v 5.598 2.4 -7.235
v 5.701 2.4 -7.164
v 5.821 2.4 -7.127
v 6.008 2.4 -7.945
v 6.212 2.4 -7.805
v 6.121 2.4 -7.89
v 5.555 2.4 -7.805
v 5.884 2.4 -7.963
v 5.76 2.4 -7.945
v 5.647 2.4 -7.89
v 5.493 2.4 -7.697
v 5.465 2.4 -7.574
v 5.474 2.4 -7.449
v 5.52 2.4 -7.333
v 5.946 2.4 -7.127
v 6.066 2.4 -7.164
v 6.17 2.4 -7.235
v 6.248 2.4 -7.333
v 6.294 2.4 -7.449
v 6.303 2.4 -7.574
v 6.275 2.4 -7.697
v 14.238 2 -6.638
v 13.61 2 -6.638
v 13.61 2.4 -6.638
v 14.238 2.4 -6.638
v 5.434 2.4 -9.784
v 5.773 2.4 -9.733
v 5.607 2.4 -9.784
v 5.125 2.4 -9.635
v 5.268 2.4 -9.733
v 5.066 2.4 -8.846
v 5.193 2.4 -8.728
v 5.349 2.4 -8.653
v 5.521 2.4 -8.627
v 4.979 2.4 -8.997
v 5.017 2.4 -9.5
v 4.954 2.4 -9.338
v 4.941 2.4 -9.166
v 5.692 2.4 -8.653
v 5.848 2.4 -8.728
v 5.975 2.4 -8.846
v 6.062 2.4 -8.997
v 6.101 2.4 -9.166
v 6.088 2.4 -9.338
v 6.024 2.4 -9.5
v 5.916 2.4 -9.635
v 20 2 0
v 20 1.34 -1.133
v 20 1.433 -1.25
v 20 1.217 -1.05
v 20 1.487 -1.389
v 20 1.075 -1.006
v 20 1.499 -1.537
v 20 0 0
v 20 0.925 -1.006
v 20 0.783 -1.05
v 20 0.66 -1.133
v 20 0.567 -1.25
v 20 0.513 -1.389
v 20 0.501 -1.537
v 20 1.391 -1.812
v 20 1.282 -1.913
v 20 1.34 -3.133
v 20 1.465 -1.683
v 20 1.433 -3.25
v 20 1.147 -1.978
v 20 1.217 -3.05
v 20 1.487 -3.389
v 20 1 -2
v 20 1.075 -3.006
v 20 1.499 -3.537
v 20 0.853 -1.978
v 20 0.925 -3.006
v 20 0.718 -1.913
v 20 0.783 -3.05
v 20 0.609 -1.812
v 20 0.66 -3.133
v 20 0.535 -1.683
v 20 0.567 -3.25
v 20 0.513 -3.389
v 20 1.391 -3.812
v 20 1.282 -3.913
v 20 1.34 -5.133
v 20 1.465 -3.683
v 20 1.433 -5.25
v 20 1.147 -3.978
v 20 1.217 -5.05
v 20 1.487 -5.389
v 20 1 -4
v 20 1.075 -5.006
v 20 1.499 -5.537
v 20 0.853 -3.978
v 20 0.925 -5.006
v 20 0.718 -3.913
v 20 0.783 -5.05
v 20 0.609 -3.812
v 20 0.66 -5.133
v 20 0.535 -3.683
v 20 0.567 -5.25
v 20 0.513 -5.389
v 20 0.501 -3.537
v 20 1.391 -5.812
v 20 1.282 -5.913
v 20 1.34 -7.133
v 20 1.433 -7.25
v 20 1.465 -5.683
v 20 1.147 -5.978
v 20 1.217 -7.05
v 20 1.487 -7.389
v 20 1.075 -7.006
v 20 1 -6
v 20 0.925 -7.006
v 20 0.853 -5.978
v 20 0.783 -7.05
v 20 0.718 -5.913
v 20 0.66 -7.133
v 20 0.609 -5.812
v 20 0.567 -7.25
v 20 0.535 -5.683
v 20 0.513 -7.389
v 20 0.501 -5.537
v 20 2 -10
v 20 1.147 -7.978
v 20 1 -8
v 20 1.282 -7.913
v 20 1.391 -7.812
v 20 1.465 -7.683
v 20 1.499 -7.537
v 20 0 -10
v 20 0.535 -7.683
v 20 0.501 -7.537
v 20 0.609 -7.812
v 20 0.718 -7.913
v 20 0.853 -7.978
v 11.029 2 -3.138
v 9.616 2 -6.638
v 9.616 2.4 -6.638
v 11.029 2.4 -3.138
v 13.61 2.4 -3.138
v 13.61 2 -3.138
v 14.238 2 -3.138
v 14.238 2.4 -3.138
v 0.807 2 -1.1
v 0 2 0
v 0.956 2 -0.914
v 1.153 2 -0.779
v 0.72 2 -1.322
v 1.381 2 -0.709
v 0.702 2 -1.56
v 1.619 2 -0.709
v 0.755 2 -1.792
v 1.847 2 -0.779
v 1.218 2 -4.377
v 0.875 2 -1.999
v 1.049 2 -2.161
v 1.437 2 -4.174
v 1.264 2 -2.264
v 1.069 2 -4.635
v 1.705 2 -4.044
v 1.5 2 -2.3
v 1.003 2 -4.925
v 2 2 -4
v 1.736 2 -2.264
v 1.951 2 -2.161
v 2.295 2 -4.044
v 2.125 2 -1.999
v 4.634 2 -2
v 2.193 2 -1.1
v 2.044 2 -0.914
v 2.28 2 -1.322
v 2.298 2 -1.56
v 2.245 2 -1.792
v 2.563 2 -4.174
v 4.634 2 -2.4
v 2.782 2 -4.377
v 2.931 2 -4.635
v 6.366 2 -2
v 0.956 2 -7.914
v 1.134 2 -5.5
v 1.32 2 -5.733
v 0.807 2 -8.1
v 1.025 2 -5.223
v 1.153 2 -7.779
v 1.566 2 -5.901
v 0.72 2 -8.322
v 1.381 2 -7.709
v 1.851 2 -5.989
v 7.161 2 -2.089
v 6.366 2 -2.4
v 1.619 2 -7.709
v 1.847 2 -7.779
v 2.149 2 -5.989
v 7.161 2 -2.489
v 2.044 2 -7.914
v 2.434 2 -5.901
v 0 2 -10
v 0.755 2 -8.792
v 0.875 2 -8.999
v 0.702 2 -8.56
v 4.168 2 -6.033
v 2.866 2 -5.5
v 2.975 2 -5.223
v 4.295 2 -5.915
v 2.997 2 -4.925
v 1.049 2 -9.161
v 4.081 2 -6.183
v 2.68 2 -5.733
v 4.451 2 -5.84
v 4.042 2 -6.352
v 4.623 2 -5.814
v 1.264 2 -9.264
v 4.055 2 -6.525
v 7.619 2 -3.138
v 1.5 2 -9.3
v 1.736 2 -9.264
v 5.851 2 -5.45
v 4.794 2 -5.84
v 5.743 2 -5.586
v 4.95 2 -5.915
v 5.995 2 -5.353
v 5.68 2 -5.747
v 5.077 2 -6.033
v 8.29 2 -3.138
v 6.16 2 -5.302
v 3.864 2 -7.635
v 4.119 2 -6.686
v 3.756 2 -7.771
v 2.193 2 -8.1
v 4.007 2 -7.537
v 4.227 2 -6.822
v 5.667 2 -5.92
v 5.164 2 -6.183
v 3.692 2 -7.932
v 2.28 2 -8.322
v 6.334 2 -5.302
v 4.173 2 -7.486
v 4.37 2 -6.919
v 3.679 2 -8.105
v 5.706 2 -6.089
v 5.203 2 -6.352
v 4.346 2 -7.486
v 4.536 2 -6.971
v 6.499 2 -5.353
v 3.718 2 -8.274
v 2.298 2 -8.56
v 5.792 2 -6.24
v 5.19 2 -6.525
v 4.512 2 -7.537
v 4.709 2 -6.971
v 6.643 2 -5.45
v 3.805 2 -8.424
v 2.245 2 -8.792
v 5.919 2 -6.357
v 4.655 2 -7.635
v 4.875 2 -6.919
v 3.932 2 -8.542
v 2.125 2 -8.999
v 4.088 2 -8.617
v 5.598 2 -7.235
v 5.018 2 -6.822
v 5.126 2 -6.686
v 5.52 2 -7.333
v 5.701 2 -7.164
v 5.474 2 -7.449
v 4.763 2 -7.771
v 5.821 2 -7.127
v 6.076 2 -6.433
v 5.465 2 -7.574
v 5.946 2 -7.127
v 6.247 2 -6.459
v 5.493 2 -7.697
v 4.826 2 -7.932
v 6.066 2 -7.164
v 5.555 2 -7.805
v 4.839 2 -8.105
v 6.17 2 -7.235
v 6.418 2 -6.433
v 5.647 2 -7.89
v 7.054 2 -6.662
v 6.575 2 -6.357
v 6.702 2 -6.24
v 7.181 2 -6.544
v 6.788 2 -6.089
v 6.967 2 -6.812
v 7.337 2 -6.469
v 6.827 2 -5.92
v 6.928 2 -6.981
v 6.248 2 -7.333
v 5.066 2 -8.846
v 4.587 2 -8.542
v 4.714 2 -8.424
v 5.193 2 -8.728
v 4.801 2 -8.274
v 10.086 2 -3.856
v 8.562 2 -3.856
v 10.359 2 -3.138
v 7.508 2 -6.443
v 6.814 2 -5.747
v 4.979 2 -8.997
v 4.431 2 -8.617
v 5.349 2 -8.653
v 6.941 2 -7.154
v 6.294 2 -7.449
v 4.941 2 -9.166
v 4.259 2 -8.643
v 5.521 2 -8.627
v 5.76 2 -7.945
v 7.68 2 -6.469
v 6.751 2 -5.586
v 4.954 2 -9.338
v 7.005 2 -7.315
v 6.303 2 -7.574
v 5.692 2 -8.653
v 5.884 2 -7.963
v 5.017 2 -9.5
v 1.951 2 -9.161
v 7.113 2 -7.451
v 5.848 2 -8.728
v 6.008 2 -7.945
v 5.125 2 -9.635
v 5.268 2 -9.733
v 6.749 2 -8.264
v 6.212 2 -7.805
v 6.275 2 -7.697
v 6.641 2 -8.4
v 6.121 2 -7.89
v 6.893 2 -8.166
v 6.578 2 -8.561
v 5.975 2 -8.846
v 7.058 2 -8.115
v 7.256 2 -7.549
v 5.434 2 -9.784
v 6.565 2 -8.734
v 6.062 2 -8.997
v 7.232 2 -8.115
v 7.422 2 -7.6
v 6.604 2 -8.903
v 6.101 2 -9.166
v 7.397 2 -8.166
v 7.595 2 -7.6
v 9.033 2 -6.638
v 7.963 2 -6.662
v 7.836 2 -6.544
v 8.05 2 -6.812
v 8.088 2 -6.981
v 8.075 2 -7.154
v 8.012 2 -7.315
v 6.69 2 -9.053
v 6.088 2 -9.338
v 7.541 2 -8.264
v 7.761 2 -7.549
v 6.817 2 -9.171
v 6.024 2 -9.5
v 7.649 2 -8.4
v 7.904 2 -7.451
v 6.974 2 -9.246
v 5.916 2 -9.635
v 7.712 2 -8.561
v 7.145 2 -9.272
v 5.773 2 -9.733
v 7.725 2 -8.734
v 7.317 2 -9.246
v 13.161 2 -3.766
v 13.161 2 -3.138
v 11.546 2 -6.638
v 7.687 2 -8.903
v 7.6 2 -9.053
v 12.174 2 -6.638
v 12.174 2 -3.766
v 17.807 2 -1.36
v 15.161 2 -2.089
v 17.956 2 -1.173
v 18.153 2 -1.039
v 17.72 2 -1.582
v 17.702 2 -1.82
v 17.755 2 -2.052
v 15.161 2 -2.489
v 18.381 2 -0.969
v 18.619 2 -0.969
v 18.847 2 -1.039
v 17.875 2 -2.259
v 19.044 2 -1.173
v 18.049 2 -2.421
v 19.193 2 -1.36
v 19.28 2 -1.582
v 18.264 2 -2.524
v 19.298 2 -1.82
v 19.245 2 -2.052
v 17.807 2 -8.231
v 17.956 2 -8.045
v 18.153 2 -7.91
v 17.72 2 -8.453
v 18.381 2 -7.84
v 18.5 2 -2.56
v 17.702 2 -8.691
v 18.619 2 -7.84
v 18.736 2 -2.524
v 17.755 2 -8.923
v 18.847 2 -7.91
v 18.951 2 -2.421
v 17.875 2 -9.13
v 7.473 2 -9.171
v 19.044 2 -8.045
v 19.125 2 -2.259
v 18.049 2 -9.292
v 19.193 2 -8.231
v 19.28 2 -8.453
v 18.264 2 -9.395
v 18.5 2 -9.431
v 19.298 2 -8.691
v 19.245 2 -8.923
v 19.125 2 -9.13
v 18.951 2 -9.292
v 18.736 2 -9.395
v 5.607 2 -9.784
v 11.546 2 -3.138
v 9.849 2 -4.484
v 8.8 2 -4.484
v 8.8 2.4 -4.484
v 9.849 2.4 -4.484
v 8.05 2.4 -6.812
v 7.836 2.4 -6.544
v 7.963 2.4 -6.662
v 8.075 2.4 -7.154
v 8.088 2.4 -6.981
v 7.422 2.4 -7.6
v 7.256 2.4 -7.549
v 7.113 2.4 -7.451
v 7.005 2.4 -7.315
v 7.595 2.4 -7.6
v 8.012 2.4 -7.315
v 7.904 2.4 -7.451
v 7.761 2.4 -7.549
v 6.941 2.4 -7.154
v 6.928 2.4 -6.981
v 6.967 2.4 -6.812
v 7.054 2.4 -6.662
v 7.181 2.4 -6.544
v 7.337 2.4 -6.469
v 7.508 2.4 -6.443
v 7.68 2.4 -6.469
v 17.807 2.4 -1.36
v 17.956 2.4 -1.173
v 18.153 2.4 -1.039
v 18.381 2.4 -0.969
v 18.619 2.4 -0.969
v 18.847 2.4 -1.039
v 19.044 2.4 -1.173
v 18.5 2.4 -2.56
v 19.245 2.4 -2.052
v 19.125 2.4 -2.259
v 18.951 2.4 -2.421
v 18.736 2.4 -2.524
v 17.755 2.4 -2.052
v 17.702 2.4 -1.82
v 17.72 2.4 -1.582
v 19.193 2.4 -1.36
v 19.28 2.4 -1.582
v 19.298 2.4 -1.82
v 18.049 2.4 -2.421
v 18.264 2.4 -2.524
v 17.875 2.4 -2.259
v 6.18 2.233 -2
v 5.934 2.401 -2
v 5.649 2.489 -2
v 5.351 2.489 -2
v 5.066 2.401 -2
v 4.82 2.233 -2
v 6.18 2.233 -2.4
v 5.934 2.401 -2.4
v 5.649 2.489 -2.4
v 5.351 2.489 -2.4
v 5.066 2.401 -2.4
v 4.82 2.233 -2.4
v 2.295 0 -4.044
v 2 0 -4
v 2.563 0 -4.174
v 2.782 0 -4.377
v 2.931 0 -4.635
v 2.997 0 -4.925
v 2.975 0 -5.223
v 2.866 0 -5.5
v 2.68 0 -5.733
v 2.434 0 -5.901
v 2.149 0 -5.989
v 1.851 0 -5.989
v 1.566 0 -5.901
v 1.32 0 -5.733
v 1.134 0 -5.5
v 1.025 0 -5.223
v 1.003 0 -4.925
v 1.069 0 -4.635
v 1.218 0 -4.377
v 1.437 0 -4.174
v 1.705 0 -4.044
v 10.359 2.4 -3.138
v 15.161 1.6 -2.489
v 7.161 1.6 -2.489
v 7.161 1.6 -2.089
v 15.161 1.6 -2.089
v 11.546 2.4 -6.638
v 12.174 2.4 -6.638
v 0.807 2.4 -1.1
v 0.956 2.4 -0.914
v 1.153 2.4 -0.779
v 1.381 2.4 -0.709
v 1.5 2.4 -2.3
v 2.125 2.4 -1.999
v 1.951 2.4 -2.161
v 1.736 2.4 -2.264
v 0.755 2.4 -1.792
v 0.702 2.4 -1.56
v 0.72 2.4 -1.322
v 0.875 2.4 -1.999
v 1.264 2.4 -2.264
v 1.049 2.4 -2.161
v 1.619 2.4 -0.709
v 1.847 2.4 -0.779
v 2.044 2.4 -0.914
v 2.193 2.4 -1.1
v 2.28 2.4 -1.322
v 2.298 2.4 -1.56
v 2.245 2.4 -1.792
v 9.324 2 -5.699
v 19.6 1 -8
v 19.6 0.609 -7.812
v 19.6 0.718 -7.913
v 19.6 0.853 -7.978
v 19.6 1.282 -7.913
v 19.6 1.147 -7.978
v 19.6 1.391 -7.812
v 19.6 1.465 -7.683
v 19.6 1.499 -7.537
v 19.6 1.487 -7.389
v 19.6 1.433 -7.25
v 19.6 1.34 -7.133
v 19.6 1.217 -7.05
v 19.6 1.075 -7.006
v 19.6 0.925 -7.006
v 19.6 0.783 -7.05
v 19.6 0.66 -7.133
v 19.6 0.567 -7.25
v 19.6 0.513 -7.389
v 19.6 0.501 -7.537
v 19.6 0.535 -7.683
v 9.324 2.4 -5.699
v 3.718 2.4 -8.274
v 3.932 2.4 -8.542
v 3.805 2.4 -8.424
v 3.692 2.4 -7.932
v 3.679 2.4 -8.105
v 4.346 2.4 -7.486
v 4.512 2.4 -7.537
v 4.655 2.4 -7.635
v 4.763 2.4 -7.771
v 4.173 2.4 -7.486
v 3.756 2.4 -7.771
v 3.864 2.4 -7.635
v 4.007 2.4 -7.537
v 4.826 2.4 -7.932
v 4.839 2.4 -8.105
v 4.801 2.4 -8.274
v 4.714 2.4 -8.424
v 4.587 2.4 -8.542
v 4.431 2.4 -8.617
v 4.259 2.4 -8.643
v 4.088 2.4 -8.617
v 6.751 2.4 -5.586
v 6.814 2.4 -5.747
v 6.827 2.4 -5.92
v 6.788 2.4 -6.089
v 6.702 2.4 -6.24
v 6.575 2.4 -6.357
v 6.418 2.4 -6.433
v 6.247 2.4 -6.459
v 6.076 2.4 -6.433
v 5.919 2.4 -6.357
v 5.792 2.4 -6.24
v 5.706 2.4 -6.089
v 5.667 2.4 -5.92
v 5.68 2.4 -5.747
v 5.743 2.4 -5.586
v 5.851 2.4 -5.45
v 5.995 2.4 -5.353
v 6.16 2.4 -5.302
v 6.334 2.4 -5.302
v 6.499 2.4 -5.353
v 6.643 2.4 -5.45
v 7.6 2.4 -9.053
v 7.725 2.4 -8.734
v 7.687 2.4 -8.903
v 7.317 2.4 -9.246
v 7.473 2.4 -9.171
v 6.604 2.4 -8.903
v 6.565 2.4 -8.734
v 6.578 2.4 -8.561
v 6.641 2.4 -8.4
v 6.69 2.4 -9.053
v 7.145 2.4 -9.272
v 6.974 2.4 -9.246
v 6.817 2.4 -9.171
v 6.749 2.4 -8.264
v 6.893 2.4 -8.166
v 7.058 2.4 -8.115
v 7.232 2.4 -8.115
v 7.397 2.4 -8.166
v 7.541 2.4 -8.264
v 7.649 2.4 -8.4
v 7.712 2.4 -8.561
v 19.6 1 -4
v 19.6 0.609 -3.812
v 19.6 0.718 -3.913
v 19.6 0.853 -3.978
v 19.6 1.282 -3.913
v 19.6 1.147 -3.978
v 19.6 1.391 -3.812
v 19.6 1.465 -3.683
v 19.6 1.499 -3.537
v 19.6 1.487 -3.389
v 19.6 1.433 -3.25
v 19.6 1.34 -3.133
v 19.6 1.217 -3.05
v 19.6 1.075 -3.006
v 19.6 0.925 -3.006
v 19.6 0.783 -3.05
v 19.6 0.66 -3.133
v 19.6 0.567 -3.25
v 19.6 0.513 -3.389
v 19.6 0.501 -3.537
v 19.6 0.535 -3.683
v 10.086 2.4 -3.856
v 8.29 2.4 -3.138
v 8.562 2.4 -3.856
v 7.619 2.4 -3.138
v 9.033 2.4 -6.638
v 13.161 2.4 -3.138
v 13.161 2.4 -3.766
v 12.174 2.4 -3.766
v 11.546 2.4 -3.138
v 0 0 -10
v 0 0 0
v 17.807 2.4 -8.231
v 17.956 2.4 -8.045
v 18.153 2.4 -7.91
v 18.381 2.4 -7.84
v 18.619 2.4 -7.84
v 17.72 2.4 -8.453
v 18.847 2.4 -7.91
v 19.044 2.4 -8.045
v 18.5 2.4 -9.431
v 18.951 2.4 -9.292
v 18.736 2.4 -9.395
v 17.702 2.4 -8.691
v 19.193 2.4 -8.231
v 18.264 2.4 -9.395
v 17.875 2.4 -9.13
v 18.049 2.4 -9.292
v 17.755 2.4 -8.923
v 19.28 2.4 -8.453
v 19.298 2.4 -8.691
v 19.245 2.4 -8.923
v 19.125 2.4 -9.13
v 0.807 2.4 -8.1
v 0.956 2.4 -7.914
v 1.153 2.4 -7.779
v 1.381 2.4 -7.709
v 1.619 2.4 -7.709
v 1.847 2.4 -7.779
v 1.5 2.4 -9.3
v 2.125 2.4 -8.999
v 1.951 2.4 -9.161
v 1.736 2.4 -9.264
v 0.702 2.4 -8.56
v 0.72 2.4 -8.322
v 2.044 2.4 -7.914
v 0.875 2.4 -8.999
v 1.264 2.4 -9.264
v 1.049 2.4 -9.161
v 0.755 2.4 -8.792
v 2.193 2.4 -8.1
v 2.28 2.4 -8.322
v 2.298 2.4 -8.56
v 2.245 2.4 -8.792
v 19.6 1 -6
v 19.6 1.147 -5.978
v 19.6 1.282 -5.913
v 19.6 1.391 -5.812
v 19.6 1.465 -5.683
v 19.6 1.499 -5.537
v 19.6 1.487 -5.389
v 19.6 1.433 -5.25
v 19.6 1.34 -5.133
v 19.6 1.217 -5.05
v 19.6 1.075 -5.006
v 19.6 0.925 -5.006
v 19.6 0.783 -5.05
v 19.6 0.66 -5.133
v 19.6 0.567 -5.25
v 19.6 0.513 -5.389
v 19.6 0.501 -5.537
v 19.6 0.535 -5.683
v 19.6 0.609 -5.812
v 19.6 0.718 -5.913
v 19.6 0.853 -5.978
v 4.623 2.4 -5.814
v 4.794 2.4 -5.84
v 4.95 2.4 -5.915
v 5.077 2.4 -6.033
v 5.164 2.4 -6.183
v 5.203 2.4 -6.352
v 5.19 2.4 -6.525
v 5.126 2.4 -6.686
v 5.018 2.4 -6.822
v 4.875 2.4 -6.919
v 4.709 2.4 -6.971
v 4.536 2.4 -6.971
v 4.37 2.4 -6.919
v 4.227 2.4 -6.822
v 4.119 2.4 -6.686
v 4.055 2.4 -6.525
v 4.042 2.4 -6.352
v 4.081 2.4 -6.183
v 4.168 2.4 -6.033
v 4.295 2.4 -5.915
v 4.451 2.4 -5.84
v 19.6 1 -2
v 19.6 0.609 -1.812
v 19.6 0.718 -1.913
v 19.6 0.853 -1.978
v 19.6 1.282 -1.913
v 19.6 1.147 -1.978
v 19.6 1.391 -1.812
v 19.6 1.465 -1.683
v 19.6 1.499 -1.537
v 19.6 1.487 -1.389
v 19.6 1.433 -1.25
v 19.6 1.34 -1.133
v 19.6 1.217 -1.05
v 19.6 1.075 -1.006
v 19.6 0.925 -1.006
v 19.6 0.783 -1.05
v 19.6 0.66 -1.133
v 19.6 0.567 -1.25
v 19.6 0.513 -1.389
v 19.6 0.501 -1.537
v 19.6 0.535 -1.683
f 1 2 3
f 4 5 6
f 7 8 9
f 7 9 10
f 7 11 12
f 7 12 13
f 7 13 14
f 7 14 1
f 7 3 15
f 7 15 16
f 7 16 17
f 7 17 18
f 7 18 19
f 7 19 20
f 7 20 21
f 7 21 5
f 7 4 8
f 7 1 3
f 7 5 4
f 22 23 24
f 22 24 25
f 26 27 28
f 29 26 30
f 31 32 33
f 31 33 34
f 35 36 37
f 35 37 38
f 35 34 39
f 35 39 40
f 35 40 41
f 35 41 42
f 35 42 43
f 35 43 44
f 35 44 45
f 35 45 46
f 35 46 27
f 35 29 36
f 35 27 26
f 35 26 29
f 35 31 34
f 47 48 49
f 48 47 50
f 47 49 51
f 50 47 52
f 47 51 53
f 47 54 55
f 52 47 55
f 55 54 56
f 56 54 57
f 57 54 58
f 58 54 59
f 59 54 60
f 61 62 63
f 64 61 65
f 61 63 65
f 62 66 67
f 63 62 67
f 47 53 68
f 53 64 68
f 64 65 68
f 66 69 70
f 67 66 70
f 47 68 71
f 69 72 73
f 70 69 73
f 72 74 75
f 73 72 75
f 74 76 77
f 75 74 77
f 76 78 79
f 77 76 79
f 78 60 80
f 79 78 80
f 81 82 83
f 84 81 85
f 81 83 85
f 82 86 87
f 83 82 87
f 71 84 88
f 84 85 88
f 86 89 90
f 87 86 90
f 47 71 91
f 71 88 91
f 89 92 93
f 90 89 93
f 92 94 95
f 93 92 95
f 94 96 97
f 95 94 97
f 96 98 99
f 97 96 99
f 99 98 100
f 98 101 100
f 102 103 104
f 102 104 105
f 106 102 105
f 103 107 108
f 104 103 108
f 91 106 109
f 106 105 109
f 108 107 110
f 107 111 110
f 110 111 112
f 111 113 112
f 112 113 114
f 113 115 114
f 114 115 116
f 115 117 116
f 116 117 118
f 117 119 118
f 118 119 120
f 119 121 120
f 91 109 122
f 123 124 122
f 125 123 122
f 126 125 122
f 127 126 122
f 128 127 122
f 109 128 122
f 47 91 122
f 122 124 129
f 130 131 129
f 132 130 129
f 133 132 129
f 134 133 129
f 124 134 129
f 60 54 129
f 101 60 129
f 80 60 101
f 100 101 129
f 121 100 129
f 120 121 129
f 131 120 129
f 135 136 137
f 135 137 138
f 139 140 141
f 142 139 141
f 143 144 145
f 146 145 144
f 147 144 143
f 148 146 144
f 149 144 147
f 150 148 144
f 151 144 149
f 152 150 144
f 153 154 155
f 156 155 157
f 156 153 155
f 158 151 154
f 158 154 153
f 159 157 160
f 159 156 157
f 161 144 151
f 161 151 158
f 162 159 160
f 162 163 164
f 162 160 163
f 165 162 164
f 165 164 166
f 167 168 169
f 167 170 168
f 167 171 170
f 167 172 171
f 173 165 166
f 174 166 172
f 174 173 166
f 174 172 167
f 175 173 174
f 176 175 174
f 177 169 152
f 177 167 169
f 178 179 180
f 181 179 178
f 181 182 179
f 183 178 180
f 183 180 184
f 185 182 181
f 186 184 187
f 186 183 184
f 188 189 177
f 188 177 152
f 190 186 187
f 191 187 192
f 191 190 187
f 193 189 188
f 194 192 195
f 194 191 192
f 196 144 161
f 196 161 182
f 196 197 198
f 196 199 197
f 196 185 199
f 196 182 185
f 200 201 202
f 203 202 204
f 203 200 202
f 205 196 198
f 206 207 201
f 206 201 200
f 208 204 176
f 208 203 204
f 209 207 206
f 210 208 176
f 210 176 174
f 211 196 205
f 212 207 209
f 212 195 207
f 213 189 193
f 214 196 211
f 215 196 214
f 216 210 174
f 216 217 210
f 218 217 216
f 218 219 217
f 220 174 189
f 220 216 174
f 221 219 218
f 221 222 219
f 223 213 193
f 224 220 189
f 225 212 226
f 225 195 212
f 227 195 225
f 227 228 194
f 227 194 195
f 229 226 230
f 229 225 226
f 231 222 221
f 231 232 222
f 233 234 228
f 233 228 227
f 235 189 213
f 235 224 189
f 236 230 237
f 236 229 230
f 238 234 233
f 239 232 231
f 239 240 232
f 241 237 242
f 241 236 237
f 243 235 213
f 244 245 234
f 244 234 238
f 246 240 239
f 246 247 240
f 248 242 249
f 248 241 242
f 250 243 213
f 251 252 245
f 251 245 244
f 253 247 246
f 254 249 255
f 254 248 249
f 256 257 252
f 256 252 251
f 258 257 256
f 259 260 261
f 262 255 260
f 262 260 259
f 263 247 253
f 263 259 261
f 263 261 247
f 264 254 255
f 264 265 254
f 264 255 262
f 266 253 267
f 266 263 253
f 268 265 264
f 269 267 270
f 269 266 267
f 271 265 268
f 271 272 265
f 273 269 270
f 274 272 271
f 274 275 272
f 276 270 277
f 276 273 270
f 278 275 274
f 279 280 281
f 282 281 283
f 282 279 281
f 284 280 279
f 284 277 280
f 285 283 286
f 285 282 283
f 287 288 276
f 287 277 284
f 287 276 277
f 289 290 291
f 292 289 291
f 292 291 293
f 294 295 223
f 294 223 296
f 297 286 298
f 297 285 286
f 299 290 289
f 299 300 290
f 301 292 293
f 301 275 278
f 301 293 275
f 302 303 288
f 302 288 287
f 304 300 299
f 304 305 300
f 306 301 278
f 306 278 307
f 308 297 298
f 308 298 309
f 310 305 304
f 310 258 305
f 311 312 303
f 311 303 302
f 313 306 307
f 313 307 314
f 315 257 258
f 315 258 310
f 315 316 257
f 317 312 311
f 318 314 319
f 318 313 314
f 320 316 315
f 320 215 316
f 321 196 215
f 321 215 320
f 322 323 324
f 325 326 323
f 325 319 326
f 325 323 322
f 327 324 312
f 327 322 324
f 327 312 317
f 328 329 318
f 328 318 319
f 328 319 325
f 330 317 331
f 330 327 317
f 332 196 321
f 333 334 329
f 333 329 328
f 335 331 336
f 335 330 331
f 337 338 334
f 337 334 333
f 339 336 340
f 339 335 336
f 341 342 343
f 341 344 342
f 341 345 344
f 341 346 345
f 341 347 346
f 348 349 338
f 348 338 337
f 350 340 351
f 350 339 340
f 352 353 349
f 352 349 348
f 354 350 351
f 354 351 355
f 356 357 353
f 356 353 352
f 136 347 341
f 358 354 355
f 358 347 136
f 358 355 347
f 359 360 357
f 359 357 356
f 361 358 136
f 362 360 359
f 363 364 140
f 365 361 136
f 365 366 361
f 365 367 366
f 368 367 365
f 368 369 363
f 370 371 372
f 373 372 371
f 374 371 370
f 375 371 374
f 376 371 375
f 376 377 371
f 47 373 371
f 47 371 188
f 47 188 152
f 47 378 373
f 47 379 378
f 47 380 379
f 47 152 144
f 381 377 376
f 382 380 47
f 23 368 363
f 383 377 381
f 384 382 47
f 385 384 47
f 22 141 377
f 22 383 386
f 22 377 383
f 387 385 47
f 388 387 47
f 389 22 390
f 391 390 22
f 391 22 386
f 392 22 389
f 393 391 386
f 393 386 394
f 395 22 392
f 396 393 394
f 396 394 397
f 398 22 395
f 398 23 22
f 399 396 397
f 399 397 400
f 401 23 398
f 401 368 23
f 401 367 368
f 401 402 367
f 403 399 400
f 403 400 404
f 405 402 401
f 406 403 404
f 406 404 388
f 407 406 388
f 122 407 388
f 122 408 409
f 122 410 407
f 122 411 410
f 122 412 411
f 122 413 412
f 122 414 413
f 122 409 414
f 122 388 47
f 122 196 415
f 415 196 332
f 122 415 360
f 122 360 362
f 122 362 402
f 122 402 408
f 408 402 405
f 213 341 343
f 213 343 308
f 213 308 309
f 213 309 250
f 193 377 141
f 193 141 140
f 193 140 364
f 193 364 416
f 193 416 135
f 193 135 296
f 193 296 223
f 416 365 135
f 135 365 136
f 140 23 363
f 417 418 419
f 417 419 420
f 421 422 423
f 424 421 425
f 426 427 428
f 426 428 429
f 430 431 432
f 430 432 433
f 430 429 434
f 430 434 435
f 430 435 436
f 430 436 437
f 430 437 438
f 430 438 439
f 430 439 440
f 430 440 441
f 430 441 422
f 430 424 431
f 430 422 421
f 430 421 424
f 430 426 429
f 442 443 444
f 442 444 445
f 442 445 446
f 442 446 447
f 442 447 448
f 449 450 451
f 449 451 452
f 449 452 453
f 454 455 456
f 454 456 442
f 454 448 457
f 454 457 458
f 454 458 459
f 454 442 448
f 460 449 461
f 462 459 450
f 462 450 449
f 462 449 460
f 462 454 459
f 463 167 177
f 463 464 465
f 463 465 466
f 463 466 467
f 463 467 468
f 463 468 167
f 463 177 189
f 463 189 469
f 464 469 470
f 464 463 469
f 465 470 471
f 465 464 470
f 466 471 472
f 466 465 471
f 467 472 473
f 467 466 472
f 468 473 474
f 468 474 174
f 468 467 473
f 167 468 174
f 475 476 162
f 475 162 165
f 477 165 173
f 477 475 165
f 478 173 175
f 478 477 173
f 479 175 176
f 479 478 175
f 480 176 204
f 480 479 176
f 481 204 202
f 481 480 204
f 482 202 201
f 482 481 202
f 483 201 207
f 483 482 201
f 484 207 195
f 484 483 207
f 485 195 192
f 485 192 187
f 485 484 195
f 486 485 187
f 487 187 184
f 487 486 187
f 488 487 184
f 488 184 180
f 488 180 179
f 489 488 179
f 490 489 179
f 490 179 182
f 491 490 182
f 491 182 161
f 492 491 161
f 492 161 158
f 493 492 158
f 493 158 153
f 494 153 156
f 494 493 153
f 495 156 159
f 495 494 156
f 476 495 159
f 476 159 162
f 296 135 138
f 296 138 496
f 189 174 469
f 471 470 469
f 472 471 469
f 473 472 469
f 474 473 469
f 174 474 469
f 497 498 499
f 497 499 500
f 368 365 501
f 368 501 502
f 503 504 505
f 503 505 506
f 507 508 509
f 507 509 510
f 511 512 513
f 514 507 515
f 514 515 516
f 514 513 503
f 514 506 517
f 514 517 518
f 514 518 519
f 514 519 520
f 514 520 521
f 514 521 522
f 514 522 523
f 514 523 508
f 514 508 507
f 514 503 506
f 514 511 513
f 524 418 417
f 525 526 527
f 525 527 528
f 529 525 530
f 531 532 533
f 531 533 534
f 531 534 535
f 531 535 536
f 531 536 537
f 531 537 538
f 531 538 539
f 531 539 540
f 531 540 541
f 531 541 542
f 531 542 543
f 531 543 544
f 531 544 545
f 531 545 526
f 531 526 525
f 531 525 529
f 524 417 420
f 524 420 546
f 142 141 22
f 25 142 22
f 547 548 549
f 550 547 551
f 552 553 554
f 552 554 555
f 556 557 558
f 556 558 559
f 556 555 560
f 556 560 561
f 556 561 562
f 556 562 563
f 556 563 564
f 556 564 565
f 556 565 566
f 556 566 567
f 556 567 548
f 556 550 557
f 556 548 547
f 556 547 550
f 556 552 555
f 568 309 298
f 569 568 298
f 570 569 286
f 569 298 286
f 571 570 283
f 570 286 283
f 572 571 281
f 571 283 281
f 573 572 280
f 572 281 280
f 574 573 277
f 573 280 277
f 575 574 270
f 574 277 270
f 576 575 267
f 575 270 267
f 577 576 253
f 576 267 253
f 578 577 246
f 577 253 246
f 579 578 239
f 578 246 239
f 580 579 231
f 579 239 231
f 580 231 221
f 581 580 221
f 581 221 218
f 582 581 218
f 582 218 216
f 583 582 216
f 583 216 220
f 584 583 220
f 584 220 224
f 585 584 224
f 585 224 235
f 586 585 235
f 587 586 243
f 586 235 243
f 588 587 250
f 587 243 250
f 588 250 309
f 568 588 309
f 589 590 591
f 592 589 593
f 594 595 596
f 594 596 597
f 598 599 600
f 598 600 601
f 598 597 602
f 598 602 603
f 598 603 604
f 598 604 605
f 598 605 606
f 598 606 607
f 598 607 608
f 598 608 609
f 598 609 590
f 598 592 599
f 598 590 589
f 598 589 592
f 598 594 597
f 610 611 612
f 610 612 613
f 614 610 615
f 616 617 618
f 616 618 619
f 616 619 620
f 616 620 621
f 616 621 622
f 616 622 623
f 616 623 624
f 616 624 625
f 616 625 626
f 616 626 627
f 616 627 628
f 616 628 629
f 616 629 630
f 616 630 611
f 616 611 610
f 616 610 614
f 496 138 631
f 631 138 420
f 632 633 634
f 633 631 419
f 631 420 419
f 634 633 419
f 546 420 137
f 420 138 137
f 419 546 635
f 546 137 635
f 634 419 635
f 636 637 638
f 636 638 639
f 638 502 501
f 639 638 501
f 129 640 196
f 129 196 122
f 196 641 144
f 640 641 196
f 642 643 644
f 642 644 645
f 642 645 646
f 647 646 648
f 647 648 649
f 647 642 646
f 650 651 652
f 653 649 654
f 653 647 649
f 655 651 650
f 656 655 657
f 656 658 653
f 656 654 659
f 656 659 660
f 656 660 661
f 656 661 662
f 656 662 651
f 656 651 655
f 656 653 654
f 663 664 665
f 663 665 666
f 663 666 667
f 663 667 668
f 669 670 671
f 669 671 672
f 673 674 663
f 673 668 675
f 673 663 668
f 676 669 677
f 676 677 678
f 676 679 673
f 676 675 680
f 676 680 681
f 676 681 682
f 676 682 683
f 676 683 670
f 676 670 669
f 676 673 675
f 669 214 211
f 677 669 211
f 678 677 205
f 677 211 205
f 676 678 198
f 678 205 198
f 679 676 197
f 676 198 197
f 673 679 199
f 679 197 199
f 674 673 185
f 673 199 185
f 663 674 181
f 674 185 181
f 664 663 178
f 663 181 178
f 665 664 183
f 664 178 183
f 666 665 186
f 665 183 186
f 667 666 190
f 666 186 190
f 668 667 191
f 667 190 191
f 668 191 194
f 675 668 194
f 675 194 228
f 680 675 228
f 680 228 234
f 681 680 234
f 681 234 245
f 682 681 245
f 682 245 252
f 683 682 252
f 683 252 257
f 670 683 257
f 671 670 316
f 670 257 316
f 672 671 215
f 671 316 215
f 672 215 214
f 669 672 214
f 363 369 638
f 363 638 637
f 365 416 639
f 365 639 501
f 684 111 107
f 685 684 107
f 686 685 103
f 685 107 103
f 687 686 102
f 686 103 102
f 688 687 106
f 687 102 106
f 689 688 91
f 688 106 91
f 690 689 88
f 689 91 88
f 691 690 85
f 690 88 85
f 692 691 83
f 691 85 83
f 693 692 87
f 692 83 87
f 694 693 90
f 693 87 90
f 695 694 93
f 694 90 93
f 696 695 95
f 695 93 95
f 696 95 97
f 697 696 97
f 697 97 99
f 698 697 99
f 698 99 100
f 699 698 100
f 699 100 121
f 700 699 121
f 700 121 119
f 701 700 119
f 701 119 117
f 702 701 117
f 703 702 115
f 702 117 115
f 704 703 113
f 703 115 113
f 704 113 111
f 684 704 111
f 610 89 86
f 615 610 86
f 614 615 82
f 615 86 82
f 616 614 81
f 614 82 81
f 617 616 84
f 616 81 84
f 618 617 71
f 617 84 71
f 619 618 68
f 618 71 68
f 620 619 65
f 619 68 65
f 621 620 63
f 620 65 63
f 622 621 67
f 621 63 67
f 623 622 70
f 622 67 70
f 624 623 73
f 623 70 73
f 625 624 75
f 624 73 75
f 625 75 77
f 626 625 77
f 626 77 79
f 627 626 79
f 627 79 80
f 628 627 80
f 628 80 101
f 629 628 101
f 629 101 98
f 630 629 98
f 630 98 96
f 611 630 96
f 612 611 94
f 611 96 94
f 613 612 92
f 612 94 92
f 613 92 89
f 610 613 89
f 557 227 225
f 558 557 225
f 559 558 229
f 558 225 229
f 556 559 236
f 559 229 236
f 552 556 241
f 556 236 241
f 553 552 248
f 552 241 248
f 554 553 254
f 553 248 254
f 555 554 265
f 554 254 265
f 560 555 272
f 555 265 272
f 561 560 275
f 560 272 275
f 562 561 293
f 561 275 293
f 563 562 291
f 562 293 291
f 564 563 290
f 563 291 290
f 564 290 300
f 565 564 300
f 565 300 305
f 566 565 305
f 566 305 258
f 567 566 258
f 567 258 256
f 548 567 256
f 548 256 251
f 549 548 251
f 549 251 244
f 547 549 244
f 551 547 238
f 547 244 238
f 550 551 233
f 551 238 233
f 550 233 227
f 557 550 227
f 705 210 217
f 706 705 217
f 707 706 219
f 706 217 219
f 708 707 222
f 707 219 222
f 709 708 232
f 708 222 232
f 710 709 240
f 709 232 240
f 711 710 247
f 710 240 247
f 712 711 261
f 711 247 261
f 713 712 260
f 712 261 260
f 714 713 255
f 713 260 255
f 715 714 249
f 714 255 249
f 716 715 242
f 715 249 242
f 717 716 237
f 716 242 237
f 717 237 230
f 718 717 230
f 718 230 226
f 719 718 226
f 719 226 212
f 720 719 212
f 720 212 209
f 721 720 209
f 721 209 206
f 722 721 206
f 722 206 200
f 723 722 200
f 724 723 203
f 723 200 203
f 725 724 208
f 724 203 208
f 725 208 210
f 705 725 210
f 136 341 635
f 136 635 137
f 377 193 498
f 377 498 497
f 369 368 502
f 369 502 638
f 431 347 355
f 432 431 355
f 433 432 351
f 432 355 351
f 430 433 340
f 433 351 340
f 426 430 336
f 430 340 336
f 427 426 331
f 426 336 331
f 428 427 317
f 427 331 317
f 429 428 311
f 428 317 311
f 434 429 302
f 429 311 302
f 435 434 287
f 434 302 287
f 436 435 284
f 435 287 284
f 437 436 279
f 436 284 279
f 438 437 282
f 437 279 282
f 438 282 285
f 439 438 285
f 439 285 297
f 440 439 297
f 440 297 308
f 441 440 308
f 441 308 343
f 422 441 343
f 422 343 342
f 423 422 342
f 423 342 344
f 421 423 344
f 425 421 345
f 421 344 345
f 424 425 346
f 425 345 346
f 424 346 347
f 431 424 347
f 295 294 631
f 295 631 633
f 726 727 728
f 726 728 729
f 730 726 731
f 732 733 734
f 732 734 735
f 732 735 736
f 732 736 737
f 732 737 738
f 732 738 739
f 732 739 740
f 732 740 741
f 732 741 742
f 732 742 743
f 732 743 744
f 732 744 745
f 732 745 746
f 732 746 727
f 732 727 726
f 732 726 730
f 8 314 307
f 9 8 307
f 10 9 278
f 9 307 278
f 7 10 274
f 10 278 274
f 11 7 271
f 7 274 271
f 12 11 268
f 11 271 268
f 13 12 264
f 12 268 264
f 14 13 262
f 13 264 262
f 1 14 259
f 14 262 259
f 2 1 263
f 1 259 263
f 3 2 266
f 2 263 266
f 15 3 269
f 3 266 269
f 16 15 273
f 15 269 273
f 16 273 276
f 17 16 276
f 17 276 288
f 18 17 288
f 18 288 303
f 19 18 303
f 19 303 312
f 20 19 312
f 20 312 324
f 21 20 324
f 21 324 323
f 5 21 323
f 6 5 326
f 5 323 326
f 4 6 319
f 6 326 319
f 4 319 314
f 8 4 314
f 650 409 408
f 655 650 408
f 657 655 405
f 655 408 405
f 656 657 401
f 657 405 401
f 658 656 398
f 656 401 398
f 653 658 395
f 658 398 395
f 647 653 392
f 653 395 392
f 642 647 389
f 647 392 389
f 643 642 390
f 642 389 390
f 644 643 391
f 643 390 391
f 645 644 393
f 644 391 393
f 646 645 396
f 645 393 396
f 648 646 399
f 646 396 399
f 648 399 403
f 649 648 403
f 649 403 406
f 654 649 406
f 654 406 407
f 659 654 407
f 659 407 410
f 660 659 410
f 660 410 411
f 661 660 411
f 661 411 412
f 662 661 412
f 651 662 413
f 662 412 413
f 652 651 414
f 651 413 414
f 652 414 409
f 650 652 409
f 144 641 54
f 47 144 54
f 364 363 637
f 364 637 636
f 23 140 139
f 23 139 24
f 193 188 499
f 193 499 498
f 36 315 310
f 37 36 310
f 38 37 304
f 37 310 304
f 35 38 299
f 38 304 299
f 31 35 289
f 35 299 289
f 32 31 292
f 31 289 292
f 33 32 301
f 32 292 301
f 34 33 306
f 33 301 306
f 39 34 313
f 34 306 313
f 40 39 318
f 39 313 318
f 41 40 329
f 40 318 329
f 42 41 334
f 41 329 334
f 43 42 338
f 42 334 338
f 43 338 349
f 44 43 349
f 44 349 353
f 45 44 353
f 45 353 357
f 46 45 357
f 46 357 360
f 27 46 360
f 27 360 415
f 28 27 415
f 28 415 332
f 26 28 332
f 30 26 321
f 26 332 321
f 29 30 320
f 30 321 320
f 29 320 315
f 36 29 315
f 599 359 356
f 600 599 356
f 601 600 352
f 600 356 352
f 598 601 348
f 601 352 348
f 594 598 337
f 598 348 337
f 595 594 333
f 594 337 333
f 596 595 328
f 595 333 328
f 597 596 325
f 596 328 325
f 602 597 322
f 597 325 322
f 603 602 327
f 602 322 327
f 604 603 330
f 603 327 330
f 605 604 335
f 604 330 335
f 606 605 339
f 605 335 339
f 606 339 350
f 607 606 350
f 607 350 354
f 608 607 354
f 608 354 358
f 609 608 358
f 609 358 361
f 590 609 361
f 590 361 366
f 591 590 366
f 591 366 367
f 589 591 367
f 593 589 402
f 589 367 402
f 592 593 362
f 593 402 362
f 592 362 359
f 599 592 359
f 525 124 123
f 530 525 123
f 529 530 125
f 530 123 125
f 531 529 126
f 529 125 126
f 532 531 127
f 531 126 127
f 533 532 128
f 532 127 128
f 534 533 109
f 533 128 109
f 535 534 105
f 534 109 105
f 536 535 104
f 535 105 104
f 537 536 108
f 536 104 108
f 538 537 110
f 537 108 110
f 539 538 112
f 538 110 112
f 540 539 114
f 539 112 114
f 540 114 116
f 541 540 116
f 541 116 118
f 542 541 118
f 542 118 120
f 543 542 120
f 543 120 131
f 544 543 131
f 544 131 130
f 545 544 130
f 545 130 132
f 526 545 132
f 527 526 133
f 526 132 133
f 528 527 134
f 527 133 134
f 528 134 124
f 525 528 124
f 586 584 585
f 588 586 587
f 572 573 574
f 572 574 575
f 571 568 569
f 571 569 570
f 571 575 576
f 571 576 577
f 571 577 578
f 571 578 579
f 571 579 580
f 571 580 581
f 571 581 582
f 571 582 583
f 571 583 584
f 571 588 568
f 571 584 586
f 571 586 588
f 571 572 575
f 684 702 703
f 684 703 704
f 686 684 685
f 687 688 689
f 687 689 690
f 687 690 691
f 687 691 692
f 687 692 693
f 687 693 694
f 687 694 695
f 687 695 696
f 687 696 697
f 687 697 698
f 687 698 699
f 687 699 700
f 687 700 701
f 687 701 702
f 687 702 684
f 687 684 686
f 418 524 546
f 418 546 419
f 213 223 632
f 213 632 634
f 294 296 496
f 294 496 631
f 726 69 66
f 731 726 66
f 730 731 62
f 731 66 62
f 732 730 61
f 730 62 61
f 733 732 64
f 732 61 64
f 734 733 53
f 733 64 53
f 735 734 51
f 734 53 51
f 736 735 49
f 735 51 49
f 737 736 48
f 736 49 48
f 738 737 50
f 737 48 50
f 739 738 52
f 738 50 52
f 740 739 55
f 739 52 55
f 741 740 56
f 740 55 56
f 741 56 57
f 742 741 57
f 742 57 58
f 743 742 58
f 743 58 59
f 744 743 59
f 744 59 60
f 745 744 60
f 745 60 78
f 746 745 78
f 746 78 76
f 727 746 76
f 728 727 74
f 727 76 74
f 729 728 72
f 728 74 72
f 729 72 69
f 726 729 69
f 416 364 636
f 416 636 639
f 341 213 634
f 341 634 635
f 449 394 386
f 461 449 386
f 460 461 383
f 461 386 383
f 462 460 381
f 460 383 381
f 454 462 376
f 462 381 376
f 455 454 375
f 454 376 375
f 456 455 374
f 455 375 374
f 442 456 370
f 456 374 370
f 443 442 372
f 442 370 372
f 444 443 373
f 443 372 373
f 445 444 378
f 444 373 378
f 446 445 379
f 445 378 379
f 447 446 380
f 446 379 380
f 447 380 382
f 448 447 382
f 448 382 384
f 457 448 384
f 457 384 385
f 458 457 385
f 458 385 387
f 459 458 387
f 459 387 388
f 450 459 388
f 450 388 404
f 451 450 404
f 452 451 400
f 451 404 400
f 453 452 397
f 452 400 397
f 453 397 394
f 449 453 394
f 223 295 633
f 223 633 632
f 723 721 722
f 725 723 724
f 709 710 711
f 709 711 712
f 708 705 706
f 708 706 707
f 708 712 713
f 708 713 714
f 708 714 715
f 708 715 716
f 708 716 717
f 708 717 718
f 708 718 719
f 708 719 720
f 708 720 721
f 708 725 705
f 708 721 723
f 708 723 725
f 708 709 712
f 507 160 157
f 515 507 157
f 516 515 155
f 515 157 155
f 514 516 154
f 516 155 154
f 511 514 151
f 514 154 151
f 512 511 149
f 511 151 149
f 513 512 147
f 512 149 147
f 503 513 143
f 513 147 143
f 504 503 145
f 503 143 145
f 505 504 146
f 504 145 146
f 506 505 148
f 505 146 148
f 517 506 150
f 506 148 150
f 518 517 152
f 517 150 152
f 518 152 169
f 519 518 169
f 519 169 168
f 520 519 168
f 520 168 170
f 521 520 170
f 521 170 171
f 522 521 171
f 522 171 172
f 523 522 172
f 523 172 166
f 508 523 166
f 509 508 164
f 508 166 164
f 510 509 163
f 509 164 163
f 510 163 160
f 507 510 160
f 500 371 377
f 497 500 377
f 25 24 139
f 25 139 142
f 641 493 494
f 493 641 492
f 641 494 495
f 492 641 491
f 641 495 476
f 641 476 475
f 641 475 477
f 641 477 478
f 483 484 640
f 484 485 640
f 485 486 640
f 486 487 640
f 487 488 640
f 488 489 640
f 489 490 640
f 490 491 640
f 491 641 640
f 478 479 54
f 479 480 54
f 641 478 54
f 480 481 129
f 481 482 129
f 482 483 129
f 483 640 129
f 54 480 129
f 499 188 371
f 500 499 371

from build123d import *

# Parameters (mm, degrees)
SKETCH1_W           = 20
SKETCH1_H           = 10
SKETCH1_R           = 1
BOSS_EXTRUDE1_DEPTH = 2
SKETCH2_W           = 0.628205128
SKETCH2_H           = 3.5
BOSS_EXTRUDE2_DEPTH = 0.4
SKETCH4_W           = 8
SKETCH4_H           = 0.4
CUT_EXTRUDE4_DEPTH  = 0.4
SKETCH5_R           = 0.8
BOSS_EXTRUDE3_DEPTH = 0.4
SKETCH7_R           = 0.581669736
BOSS_EXTRUDE4_DEPTH = 0.4
SKETCH6_R           = 0.420338274
BOSS_EXTRUDE5_DEPTH = 0.4
CIRPATTERN1_COUNT   = 6
SKETCH8_R           = 0.5
CUT_EXTRUDE6_DEPTH  = 0.4
LPATTERN1_COUNT     = 4
LPATTERN1_PITCH     = 2
BOSS_EXTRUDE6_START = -2
SKETCH10_R          = 1
BOSS_EXTRUDE6_DEPTH = 0.4


with BuildPart() as part:
    # Sketch1 → Boss-Extrude1 (new body)
    with BuildSketch(Plane(origin=(0, 0, 0), x_dir=(1, 0, 0), z_dir=(0, 1, 0))):
        with Locations((10, 5)):
            Rectangle(SKETCH1_W, SKETCH1_H)
        with Locations(Location((2, 5, 0), (0, 0, 270))):
            Circle(SKETCH1_R, mode=Mode.SUBTRACT)
    extrude(amount=BOSS_EXTRUDE1_DEPTH)

    # Sketch2 → Boss-Extrude2 (add)
    # profile 1 of 3: a face of its own
    with BuildSketch(Plane(origin=(0, 2, 0), x_dir=(1, 0, 0), z_dir=(0, 1, 0))):
        Polygon((9.033403528, 6.638234894), (9.616035739, 6.638234894), (11.029497278, 3.138234894), (10.35852372, 3.138234894), (10.086488463, 3.856183612), (8.56154856, 3.856183612), (8.289513303, 3.138234894), (7.619240867, 3.138234894), align=None)
        Polygon((9.324369072, 5.69943281), (8.79992997, 4.48438874), (9.848808175, 4.48438874), align=None, mode=Mode.SUBTRACT)
    # profile 2 of 3: a face of its own
    with BuildSketch(Plane(origin=(0, 2, 0), x_dir=(1, 0, 0), z_dir=(0, 1, 0))):
        Polygon((11.545522919, 6.638234894), (12.173728047, 6.638234894), (12.173728047, 3.766440022), (13.160907534, 3.766440022), (13.160907534, 3.138234894), (11.545522919, 3.138234894), align=None)
    # profile 3 of 3: a face of its own
    with BuildSketch(Plane(origin=(0, 2, 0), x_dir=(1, 0, 0), z_dir=(0, 1, 0))):
        with Locations((13.923728047, 4.888234894)):
            Rectangle(SKETCH2_W, SKETCH2_H)
    extrude(amount=BOSS_EXTRUDE2_DEPTH)

    # Sketch4 → Cut-Extrude4 (cut)
    with BuildSketch(Plane(origin=(0, 2, 0), x_dir=(1, 0, 0), z_dir=(0, 1, 0))):
        with Locations((11.161065363, 2.289063397)):
            Rectangle(SKETCH4_W, SKETCH4_H)
    extrude(amount=-CUT_EXTRUDE4_DEPTH, mode=Mode.SUBTRACT)

    # Sketch5 → Boss-Extrude3 (add)
    with BuildSketch(Plane(origin=(0, 2, 0), x_dir=(1, 0, 0), z_dir=(0, 1, 0))):
        with Locations(Location((1.5, 8.5, 0), (0, 0, 90))):
            Circle(SKETCH5_R)
        with Locations(Location((18.5, 8.630956257, 0), (0, 0, 90))):
            Circle(SKETCH5_R)
        with Locations(Location((18.5, 1.759911555, 0), (0, 0, 90))):
            Circle(SKETCH5_R)
        with Locations(Location((1.5, 1.5, 0), (0, 0, 90))):
            Circle(SKETCH5_R)
    extrude(amount=BOSS_EXTRUDE3_DEPTH)

    # Sketch7 → Boss-Extrude4 (add)
    with BuildSketch(Plane(origin=(0, 2, 0), x_dir=(1, 0, 0), z_dir=(0, 1, 0))):
        with Locations(Location((7.145081421, 8.690538135, 0), (0, 0, 90))):
            Circle(SKETCH7_R)
    boss_extrude4 = extrude(amount=BOSS_EXTRUDE4_DEPTH)

    # Sketch6 → Boss-Extrude5 (add)
    with BuildSketch(Plane(origin=(0, 2, 0), x_dir=(1, 0, 0), z_dir=(0, 1, 0))):
        with Locations(Location((5.883797923, 7.542946747, 0), (0, 0, 90))):
            Circle(SKETCH6_R)
    extrude(amount=BOSS_EXTRUDE5_DEPTH)

    # CirPattern1: Boss-Extrude4 ×6 about axis
    cirpattern1_axis = Axis((5.883797923, 0, -7.542946747), (0, 1, 0))
    for i in range(1, CIRPATTERN1_COUNT):
        add(boss_extrude4.rotate(cirpattern1_axis, i * 360 / CIRPATTERN1_COUNT))

    # Sketch8 → Cut-Extrude6 (cut)
    with BuildSketch(Plane(origin=(20, 0, 0), x_dir=(0, 0, -1), z_dir=(1, 0, 0))):
        with Locations((1.5, 1)):
            Circle(SKETCH8_R)
    cut_extrude6 = extrude(amount=-CUT_EXTRUDE6_DEPTH, mode=Mode.SUBTRACT)

    # LPattern1: Cut-Extrude6 ×4
    with Locations(*[(0, 0, -i * LPATTERN1_PITCH) for i in range(1, LPATTERN1_COUNT)]):
        add(cut_extrude6, mode=Mode.SUBTRACT)

    # Sketch10 → Boss-Extrude6 (add)
    with BuildSketch(Plane.XY.offset(BOSS_EXTRUDE6_START)):
        with Locations((5.5, 1.5)):
            Circle(SKETCH10_R)
    extrude(amount=-BOSS_EXTRUDE6_DEPTH)


solid = part.part
